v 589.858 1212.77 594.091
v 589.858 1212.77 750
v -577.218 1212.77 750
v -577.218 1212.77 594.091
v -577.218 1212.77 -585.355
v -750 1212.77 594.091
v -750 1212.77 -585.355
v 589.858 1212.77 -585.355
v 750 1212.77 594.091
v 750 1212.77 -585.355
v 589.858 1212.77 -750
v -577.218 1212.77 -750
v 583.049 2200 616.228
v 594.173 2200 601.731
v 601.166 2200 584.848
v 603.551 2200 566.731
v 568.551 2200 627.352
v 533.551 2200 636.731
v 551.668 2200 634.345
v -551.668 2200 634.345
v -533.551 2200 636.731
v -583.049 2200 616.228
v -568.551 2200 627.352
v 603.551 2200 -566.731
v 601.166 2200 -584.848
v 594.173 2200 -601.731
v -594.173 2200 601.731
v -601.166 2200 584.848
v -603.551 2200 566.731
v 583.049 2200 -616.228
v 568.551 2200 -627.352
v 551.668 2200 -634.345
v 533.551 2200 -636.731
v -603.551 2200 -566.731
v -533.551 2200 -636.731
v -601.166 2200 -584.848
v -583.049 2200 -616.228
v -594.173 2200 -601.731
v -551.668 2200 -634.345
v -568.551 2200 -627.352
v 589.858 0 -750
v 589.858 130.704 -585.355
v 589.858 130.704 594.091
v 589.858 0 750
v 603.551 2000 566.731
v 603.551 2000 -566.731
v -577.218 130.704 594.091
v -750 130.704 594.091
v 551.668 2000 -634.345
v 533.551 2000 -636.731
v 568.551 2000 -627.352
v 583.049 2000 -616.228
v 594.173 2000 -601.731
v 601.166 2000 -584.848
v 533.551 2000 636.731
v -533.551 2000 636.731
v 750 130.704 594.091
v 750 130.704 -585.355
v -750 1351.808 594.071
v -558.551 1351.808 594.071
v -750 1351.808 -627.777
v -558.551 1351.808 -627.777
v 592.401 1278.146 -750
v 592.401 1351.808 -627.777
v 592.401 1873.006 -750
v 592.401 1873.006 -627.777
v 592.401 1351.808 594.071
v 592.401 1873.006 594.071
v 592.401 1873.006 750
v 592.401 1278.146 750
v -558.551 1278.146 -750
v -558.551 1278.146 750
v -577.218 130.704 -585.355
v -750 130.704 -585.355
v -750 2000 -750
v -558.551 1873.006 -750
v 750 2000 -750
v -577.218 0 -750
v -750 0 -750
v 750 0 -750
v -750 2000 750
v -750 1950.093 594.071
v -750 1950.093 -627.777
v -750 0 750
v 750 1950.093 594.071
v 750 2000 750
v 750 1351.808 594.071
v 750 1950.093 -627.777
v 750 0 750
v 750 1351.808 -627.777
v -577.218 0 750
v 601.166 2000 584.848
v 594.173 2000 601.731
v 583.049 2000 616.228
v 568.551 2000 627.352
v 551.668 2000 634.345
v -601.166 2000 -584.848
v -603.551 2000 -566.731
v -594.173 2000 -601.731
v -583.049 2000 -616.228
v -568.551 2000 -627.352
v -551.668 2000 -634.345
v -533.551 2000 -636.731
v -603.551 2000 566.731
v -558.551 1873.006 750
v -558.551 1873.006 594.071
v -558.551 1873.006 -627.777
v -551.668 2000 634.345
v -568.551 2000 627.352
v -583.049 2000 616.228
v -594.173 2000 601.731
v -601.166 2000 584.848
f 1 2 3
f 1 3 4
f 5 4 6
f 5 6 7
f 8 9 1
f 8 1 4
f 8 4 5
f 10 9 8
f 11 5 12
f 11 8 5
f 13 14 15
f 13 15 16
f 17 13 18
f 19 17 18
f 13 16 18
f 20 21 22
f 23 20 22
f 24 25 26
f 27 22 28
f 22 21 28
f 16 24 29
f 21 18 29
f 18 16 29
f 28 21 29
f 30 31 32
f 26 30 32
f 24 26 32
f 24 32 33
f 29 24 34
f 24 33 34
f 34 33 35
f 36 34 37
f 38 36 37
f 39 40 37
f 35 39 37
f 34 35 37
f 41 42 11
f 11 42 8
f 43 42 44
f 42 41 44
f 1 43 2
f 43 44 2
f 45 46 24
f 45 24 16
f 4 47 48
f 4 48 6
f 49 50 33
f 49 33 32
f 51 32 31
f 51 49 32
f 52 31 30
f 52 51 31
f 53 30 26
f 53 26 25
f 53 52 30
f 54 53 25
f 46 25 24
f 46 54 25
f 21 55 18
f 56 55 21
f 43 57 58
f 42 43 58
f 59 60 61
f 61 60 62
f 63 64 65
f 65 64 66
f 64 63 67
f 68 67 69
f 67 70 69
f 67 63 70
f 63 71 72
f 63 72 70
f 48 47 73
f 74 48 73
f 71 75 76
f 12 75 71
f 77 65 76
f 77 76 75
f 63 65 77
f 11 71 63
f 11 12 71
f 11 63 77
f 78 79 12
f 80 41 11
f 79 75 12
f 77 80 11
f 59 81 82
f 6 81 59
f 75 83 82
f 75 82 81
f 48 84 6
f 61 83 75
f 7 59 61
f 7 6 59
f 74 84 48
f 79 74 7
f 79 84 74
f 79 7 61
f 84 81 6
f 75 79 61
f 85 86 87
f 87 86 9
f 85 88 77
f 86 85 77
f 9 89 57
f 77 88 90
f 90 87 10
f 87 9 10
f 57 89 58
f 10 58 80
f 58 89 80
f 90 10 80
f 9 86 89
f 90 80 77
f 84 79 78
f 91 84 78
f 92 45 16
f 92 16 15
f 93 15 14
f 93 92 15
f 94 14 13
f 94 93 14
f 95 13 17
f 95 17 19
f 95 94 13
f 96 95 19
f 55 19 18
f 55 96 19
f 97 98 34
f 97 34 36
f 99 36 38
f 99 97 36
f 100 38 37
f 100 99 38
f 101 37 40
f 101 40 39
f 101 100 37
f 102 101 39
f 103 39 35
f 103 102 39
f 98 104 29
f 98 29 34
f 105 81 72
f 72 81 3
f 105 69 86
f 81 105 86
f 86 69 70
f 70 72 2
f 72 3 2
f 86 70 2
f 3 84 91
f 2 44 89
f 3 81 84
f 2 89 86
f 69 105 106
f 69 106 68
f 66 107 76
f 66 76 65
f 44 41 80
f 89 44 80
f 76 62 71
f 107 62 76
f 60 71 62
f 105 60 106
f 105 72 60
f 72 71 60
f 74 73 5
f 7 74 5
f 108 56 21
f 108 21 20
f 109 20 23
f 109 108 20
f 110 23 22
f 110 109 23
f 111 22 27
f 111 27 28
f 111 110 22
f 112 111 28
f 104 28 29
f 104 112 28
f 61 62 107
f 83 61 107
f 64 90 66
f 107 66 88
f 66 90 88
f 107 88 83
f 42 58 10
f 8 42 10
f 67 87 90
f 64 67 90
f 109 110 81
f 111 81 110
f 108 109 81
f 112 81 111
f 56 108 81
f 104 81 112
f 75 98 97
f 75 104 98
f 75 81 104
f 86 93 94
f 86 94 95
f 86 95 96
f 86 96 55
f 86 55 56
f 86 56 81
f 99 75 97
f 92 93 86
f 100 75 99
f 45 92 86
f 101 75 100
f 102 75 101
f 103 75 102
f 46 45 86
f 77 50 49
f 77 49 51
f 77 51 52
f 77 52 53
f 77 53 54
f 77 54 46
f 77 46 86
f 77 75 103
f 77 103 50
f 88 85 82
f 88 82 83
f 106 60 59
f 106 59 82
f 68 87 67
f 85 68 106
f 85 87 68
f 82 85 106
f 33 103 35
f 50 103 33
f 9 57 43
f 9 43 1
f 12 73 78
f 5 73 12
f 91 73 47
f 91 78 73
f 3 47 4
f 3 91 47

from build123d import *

# Parameters (mm, degrees)
CROQUIS1_W              = 1500
CROQUIS1_H              = 1500
SALIENTE_EXTRUIR1_DEPTH = 2000
CROQUIS2_W              = 1150.952774515
CROQUIS2_H              = 594.8596712
CORTAR_EXTRUIR1_DEPTH   = 2000
CROQUIS3_W              = 1221.848688805
CROQUIS3_H              = 598.28453038
CORTAR_EXTRUIR2_DEPTH   = 2000
CROQUIS6_W              = 1179.446326032
CROQUIS6_H              = 1082.065828189
CORTAR_EXTRUIR5_DEPTH   = 2000
CROQUIS7_W              = 1167.076161376
CROQUIS7_H              = 1212.770202706
CORTAR_EXTRUIR6_DEPTH   = 2000
SALIENTE_EXTRUIR2_DEPTH = 200


with BuildPart() as part:
    # Croquis1 → Saliente-Extruir1 (new body)
    with BuildSketch(Plane(origin=(0, 0, 0), x_dir=(1, 0, 0), z_dir=(0, 1, 0))):
        Rectangle(CROQUIS1_W, CROQUIS1_H)
    extrude(amount=SALIENTE_EXTRUIR1_DEPTH)

    # Croquis2 → Cortar-Extruir1 (cut)
    with BuildSketch(Plane.XY.offset(750)):
        with Locations((16.925070171, 1575.576244906)):
            Rectangle(CROQUIS2_W, CROQUIS2_H)
    extrude(amount=-CORTAR_EXTRUIR1_DEPTH, mode=Mode.SUBTRACT)

    # Croquis3 → Cortar-Extruir2 (cut)
    with BuildSketch(Plane(origin=(750, 0, 0), x_dir=(0, 0, -1), z_dir=(1, 0, 0))):
        with Locations((16.853085362, 1650.950422139)):
            Rectangle(CROQUIS3_W, CROQUIS3_H)
    extrude(amount=-CORTAR_EXTRUIR2_DEPTH, mode=Mode.SUBTRACT)

    # Croquis6 → Cortar-Extruir5 (cut)
    with BuildSketch(Plane(origin=(750, 0, 0), x_dir=(0, 0, -1), z_dir=(1, 0, 0))):
        with Locations((-4.368319726, 671.737288611)):
            Rectangle(CROQUIS6_W, CROQUIS6_H)
    extrude(amount=-CORTAR_EXTRUIR5_DEPTH, mode=Mode.SUBTRACT)

    # Croquis7 → Cortar-Extruir6 (cut)
    with BuildSketch(Plane.XY.offset(750)):
        with Locations((6.319907011, 606.385101353)):
            Rectangle(CROQUIS7_W, CROQUIS7_H)
    extrude(amount=-CORTAR_EXTRUIR6_DEPTH, mode=Mode.SUBTRACT)

    # Croquis10 → Saliente-Extruir2 (add)
    with BuildSketch(Plane(origin=(0, 2000, 0), x_dir=(1, 0, 0), z_dir=(0, 1, 0))):
        with BuildLine():
            Line((-533.551119556, 636.730631364), (533.551119556, 636.730631364))
            ThreePointArc((533.551119556, 636.730631364), (583.048594239, 616.228106047), (603.551119556, 566.730631364))
            Line((603.551119556, 566.730631364), (603.551119556, -566.730631364))
            ThreePointArc((603.551119556, -566.730631364), (583.048594239, -616.228106047), (533.551119556, -636.730631364))
            Line((533.551119556, -636.730631364), (-533.551119556, -636.730631364))
            ThreePointArc((-533.551119556, -636.730631364), (-583.048594239, -616.228106047), (-603.551119556, -566.730631364))
            Line((-603.551119556, -566.730631364), (-603.551119556, 566.730631364))
            ThreePointArc((-603.551119556, 566.730631364), (-583.048594239, 616.228106047), (-533.551119556, 636.730631364))
        make_face()
    extrude(amount=SALIENTE_EXTRUIR2_DEPTH)


solid = part.part
